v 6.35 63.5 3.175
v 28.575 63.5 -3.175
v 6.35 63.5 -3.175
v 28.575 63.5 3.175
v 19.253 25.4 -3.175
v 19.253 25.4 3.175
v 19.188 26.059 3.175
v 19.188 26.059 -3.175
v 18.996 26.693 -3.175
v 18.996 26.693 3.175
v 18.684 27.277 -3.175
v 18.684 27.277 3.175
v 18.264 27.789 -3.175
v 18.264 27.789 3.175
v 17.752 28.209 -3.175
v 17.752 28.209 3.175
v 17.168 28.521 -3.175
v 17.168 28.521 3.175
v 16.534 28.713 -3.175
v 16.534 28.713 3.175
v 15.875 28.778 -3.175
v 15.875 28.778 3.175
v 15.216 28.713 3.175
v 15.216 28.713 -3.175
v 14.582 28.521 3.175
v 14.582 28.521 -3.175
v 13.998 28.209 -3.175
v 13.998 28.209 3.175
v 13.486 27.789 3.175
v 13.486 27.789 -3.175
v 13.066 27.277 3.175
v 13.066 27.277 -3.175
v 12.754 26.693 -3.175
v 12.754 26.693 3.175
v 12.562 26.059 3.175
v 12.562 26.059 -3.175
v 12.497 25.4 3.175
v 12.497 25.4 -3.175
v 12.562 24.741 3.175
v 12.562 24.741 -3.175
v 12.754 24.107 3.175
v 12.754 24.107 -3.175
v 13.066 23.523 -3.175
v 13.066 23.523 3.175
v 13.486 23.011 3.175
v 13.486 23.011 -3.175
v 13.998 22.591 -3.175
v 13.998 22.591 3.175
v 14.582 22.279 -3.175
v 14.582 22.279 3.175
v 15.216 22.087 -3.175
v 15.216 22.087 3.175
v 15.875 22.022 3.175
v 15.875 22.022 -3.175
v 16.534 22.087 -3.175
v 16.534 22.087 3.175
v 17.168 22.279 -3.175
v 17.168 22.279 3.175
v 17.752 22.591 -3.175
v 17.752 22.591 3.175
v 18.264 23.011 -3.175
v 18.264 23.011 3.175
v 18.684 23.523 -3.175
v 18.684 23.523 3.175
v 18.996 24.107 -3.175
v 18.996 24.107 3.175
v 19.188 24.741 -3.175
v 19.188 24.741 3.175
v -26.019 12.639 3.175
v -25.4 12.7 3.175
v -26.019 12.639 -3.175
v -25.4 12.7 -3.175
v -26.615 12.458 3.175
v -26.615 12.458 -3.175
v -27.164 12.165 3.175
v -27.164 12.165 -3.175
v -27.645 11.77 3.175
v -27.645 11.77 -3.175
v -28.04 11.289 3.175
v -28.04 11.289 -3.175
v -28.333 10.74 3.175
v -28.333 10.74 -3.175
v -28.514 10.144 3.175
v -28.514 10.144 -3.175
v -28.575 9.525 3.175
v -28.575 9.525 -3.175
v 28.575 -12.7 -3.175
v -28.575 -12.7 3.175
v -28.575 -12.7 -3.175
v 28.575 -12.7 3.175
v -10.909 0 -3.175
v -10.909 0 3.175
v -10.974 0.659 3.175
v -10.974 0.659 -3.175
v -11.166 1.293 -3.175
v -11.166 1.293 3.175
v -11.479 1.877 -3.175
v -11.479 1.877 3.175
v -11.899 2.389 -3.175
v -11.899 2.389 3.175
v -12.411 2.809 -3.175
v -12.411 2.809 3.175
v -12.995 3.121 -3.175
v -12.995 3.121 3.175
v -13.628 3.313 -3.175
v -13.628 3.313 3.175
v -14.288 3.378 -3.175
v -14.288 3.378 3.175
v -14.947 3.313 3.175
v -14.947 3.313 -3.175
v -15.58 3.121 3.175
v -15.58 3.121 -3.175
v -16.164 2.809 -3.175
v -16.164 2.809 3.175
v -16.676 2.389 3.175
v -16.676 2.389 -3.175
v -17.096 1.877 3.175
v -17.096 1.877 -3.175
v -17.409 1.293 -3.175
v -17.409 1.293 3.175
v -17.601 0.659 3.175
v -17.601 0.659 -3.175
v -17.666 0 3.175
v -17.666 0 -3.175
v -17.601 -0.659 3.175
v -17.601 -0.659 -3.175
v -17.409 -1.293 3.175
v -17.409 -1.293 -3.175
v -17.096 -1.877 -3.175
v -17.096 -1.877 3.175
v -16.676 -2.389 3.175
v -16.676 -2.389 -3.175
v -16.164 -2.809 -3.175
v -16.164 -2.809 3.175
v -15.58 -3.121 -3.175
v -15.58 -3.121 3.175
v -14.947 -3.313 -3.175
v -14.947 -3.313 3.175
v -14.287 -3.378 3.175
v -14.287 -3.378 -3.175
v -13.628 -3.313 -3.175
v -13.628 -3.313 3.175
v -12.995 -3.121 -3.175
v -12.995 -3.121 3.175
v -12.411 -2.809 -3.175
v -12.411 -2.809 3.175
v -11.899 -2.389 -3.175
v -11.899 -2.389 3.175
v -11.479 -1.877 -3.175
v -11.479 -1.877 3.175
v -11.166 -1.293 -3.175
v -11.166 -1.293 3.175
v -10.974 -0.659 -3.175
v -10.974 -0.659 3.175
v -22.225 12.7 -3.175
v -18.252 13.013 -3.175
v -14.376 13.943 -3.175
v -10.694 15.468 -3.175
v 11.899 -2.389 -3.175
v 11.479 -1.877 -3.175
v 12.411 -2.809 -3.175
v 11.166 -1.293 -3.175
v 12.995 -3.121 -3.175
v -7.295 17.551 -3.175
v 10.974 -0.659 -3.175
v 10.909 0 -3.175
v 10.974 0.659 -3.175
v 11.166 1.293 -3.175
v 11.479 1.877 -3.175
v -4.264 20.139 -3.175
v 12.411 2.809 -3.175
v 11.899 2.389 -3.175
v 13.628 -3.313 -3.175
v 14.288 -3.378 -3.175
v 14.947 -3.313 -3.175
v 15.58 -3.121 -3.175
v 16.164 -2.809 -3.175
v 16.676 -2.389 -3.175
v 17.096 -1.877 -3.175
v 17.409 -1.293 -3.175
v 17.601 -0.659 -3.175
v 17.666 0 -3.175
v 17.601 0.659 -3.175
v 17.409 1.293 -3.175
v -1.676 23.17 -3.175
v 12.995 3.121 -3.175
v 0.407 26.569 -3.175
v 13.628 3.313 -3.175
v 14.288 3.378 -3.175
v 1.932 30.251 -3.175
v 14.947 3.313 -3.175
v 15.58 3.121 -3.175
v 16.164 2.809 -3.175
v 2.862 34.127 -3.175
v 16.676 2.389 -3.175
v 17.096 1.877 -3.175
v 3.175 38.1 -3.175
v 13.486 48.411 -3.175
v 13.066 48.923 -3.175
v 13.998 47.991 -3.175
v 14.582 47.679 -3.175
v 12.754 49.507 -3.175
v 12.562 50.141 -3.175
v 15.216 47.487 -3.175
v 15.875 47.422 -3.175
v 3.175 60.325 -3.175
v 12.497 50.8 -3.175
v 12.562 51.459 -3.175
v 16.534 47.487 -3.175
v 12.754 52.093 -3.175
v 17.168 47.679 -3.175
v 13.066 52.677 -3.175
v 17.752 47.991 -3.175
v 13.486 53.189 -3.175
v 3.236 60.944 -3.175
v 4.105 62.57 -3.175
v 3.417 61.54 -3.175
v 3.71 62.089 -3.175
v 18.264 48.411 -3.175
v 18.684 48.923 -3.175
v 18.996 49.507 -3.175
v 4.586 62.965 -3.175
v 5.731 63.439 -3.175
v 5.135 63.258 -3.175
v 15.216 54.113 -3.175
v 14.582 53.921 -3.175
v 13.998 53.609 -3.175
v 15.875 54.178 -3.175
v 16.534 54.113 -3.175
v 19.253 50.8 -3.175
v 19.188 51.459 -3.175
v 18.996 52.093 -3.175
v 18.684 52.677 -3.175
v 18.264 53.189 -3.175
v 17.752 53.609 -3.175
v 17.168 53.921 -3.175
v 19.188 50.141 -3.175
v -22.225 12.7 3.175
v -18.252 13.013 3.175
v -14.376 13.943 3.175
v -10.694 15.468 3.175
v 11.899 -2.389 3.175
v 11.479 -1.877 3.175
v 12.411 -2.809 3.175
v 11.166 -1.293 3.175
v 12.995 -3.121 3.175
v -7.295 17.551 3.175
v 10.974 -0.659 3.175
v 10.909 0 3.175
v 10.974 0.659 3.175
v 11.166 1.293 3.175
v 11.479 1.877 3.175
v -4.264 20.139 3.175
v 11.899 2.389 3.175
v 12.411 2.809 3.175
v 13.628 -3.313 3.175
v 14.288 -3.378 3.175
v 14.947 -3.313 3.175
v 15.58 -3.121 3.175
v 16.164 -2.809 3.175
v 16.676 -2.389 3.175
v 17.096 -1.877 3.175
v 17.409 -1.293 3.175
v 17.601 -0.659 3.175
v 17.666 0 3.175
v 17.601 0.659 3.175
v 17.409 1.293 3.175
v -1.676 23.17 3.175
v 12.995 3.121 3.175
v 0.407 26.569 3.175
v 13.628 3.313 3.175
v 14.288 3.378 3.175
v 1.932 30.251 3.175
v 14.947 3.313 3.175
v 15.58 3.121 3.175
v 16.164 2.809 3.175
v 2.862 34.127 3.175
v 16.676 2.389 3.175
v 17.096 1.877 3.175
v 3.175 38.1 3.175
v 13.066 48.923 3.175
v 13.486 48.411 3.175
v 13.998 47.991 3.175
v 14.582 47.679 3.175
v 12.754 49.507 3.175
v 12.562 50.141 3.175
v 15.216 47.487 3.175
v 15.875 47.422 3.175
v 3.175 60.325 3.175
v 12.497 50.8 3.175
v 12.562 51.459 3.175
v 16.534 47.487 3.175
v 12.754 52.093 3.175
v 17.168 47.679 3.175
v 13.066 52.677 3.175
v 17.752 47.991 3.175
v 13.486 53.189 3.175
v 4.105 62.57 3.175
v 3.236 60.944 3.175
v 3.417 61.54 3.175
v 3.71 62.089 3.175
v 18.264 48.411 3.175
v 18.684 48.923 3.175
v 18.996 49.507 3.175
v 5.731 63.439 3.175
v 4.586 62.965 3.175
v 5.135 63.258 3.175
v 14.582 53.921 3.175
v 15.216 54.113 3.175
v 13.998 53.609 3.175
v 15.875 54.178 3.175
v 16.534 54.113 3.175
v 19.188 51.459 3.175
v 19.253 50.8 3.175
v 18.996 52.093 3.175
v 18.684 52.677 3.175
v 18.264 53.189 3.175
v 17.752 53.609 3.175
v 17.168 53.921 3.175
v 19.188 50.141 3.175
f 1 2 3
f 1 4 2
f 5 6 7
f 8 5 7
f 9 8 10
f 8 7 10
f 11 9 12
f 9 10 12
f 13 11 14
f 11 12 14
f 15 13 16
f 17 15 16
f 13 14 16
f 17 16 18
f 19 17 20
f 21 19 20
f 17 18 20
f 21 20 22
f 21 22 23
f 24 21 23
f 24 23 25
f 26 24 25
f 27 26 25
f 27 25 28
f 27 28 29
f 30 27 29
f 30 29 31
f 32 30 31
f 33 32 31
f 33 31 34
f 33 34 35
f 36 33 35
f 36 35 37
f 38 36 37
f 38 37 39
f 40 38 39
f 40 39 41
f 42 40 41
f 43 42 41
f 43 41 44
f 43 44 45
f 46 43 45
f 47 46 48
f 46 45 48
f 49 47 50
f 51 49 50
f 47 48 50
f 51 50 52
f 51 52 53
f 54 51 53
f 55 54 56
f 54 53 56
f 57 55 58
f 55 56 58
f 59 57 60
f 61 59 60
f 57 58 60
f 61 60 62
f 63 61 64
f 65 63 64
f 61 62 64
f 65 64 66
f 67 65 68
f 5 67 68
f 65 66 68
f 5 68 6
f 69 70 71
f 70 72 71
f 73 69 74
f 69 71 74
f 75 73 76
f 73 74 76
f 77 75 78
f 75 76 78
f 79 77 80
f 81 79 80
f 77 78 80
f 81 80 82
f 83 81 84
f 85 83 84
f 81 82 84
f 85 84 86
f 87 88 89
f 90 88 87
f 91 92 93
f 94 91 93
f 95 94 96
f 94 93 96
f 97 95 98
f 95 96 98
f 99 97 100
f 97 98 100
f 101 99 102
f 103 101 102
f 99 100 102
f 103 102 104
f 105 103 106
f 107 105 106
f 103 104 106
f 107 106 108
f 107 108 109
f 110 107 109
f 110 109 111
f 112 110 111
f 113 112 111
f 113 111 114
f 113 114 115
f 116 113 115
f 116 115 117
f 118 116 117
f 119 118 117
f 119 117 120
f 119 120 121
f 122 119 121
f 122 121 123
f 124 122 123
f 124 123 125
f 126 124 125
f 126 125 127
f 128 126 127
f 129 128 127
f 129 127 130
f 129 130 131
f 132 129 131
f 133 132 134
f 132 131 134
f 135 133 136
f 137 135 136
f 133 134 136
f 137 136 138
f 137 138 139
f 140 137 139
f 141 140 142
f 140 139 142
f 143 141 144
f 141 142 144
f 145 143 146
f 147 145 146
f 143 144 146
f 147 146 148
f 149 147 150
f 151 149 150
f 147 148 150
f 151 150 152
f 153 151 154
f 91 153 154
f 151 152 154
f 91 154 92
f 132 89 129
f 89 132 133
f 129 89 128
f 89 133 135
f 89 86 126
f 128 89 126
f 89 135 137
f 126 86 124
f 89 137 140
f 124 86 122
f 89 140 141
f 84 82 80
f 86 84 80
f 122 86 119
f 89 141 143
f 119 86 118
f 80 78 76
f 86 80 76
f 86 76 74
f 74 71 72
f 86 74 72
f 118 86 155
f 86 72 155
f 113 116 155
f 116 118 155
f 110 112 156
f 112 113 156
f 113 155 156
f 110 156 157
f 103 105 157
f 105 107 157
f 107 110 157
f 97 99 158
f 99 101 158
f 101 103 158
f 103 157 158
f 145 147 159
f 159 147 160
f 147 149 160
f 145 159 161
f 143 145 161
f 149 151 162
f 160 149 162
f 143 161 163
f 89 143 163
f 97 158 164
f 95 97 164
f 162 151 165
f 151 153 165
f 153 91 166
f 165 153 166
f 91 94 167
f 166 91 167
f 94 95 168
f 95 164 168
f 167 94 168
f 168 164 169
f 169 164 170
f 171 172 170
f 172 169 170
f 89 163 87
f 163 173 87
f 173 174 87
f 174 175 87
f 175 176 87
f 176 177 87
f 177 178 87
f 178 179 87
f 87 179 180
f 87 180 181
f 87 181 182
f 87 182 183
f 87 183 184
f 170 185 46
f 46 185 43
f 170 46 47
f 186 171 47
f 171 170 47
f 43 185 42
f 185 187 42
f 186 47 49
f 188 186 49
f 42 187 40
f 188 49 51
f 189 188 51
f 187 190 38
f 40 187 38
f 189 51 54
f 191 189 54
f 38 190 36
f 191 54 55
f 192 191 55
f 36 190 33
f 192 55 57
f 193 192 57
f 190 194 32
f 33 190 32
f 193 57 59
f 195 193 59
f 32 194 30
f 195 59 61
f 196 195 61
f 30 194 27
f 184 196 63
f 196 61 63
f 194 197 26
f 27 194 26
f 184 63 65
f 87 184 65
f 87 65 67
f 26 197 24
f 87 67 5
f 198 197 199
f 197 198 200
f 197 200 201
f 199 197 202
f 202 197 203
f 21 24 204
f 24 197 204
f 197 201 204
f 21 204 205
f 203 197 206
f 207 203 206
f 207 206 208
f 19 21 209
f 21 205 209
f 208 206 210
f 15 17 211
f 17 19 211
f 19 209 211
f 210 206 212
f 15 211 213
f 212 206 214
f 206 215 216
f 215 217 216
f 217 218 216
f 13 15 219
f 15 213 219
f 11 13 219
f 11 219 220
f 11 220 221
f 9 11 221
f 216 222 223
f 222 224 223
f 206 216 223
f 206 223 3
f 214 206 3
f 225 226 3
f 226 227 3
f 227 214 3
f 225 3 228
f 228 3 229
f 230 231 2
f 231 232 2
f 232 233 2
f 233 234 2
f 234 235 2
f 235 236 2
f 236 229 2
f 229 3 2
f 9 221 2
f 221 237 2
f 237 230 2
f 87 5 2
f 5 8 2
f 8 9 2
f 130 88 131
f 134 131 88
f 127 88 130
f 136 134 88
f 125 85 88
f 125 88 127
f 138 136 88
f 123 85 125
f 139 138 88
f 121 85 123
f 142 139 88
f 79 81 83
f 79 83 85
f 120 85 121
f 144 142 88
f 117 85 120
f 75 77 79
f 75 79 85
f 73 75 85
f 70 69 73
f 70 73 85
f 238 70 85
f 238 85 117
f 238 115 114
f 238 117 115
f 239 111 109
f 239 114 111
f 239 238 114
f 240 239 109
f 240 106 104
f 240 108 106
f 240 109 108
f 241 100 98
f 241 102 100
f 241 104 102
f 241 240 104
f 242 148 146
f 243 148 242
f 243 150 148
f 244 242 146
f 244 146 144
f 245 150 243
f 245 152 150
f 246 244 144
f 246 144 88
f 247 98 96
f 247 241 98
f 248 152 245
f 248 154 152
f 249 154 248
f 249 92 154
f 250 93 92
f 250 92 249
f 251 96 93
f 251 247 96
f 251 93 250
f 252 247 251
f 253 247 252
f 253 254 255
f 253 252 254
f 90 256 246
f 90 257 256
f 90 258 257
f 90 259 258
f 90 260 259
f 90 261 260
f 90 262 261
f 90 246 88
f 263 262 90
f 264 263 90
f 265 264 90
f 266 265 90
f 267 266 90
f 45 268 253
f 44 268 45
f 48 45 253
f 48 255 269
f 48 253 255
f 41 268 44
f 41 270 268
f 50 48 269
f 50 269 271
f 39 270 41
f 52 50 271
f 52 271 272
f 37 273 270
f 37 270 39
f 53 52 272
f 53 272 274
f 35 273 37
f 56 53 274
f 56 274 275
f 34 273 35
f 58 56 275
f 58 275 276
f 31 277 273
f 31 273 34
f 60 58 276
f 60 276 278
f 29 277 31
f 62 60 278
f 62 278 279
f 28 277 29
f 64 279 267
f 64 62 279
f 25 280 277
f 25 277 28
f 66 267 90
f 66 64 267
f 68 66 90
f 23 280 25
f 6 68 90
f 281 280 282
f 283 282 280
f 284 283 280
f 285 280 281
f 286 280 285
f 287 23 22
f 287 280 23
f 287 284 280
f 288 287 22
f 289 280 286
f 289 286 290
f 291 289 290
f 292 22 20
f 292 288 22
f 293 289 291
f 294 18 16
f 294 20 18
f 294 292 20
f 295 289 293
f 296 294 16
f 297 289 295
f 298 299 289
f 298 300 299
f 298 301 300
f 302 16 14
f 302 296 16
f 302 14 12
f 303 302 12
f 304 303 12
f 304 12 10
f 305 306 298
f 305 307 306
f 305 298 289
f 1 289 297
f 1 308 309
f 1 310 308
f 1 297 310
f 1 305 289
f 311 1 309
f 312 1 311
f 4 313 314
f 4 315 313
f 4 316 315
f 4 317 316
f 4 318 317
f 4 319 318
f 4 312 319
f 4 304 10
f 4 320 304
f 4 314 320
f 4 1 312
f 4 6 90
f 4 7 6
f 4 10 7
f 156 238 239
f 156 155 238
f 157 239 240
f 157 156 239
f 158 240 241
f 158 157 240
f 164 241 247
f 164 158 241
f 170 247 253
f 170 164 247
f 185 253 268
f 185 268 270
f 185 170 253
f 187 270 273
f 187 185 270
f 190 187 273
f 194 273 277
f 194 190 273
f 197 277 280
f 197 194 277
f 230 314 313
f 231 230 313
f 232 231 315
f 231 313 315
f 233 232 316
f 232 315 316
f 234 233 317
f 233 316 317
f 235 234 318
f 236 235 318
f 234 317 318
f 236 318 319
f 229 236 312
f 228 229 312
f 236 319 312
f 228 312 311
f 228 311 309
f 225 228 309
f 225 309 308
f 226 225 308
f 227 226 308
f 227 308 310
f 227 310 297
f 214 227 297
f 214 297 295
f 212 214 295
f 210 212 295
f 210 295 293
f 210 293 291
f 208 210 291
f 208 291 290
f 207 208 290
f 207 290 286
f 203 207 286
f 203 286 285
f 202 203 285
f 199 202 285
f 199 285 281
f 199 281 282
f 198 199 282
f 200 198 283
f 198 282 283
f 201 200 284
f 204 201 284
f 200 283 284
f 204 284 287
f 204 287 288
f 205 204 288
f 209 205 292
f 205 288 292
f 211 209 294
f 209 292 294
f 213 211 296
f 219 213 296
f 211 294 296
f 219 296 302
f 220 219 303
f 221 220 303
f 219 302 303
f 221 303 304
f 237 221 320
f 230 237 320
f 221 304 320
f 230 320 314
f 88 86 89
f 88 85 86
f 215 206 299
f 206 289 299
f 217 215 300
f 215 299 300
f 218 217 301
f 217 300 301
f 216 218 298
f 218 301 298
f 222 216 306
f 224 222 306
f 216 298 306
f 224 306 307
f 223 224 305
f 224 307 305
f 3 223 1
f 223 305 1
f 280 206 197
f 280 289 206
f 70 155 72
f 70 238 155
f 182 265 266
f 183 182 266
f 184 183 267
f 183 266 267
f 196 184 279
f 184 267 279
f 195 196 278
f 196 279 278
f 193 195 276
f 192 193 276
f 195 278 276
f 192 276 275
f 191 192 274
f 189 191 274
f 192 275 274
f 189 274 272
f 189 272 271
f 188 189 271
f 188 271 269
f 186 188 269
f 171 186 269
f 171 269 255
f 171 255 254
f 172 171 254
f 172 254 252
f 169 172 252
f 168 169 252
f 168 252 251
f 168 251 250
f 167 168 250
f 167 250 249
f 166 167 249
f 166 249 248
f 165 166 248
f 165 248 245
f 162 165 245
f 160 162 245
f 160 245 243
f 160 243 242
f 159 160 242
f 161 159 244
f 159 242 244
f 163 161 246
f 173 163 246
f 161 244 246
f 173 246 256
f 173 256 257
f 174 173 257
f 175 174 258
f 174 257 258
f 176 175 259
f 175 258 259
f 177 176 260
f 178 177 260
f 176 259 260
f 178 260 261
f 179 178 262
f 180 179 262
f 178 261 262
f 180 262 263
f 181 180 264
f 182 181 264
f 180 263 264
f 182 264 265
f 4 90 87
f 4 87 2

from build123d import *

# Parameters (mm, degrees)
BOSS_EXTRUDE1_DEPTH = 3.175
SKETCH2_R           = 3.3782
CUT_EXTRUDE1_DEPTH  = 70.922121857
SKETCH3_R           = 3.3782
CUT_EXTRUDE2_DEPTH  = 70.922121857
FILLET1_R           = 25.4
FILLET2_R           = 3.175


with BuildPart() as part:
    # Sketch1 → Boss-Extrude1 (new, symmetric)
    with BuildSketch(Plane.XY):
        Polygon((-28.575, -12.7), (28.575, -12.7), (28.575, 63.5), (3.175, 63.5), (3.175, 12.7), (-28.575, 12.7), align=None)
    extrude(amount=BOSS_EXTRUDE1_DEPTH, both=True)

    # Sketch2 → Cut-Extrude1 (cut, through all)
    with BuildSketch(Plane.XY.offset(3.175)):
        with Locations((15.875, 25.4)):
            Circle(SKETCH2_R)
        with Locations((15.875, 50.8)):
            Circle(SKETCH2_R)
    extrude(amount=-CUT_EXTRUDE1_DEPTH, mode=Mode.SUBTRACT)

    # Sketch3 → Cut-Extrude2 (cut, through all)
    with BuildSketch(Plane.XY.offset(3.175)):
        with Locations((-14.2875, 0)):
            Circle(SKETCH3_R)
        with Locations((14.2875, 0)):
            Circle(SKETCH3_R)
    extrude(amount=-CUT_EXTRUDE2_DEPTH, mode=Mode.SUBTRACT)

    # Fillet1
    fillet1_edges = [part.edges().sort_by_distance(p)[0] for p in [
        (3.175, 12.7, 0),
    ]]
    fillet(fillet1_edges, radius=FILLET1_R)

    # Fillet2
    fillet2_edges = [part.edges().sort_by_distance(p)[0] for p in [
        (-28.575, 12.7, 0),
        (3.175, 63.5, 0),
    ]]
    fillet(fillet2_edges, radius=FILLET2_R)


solid = part.part
